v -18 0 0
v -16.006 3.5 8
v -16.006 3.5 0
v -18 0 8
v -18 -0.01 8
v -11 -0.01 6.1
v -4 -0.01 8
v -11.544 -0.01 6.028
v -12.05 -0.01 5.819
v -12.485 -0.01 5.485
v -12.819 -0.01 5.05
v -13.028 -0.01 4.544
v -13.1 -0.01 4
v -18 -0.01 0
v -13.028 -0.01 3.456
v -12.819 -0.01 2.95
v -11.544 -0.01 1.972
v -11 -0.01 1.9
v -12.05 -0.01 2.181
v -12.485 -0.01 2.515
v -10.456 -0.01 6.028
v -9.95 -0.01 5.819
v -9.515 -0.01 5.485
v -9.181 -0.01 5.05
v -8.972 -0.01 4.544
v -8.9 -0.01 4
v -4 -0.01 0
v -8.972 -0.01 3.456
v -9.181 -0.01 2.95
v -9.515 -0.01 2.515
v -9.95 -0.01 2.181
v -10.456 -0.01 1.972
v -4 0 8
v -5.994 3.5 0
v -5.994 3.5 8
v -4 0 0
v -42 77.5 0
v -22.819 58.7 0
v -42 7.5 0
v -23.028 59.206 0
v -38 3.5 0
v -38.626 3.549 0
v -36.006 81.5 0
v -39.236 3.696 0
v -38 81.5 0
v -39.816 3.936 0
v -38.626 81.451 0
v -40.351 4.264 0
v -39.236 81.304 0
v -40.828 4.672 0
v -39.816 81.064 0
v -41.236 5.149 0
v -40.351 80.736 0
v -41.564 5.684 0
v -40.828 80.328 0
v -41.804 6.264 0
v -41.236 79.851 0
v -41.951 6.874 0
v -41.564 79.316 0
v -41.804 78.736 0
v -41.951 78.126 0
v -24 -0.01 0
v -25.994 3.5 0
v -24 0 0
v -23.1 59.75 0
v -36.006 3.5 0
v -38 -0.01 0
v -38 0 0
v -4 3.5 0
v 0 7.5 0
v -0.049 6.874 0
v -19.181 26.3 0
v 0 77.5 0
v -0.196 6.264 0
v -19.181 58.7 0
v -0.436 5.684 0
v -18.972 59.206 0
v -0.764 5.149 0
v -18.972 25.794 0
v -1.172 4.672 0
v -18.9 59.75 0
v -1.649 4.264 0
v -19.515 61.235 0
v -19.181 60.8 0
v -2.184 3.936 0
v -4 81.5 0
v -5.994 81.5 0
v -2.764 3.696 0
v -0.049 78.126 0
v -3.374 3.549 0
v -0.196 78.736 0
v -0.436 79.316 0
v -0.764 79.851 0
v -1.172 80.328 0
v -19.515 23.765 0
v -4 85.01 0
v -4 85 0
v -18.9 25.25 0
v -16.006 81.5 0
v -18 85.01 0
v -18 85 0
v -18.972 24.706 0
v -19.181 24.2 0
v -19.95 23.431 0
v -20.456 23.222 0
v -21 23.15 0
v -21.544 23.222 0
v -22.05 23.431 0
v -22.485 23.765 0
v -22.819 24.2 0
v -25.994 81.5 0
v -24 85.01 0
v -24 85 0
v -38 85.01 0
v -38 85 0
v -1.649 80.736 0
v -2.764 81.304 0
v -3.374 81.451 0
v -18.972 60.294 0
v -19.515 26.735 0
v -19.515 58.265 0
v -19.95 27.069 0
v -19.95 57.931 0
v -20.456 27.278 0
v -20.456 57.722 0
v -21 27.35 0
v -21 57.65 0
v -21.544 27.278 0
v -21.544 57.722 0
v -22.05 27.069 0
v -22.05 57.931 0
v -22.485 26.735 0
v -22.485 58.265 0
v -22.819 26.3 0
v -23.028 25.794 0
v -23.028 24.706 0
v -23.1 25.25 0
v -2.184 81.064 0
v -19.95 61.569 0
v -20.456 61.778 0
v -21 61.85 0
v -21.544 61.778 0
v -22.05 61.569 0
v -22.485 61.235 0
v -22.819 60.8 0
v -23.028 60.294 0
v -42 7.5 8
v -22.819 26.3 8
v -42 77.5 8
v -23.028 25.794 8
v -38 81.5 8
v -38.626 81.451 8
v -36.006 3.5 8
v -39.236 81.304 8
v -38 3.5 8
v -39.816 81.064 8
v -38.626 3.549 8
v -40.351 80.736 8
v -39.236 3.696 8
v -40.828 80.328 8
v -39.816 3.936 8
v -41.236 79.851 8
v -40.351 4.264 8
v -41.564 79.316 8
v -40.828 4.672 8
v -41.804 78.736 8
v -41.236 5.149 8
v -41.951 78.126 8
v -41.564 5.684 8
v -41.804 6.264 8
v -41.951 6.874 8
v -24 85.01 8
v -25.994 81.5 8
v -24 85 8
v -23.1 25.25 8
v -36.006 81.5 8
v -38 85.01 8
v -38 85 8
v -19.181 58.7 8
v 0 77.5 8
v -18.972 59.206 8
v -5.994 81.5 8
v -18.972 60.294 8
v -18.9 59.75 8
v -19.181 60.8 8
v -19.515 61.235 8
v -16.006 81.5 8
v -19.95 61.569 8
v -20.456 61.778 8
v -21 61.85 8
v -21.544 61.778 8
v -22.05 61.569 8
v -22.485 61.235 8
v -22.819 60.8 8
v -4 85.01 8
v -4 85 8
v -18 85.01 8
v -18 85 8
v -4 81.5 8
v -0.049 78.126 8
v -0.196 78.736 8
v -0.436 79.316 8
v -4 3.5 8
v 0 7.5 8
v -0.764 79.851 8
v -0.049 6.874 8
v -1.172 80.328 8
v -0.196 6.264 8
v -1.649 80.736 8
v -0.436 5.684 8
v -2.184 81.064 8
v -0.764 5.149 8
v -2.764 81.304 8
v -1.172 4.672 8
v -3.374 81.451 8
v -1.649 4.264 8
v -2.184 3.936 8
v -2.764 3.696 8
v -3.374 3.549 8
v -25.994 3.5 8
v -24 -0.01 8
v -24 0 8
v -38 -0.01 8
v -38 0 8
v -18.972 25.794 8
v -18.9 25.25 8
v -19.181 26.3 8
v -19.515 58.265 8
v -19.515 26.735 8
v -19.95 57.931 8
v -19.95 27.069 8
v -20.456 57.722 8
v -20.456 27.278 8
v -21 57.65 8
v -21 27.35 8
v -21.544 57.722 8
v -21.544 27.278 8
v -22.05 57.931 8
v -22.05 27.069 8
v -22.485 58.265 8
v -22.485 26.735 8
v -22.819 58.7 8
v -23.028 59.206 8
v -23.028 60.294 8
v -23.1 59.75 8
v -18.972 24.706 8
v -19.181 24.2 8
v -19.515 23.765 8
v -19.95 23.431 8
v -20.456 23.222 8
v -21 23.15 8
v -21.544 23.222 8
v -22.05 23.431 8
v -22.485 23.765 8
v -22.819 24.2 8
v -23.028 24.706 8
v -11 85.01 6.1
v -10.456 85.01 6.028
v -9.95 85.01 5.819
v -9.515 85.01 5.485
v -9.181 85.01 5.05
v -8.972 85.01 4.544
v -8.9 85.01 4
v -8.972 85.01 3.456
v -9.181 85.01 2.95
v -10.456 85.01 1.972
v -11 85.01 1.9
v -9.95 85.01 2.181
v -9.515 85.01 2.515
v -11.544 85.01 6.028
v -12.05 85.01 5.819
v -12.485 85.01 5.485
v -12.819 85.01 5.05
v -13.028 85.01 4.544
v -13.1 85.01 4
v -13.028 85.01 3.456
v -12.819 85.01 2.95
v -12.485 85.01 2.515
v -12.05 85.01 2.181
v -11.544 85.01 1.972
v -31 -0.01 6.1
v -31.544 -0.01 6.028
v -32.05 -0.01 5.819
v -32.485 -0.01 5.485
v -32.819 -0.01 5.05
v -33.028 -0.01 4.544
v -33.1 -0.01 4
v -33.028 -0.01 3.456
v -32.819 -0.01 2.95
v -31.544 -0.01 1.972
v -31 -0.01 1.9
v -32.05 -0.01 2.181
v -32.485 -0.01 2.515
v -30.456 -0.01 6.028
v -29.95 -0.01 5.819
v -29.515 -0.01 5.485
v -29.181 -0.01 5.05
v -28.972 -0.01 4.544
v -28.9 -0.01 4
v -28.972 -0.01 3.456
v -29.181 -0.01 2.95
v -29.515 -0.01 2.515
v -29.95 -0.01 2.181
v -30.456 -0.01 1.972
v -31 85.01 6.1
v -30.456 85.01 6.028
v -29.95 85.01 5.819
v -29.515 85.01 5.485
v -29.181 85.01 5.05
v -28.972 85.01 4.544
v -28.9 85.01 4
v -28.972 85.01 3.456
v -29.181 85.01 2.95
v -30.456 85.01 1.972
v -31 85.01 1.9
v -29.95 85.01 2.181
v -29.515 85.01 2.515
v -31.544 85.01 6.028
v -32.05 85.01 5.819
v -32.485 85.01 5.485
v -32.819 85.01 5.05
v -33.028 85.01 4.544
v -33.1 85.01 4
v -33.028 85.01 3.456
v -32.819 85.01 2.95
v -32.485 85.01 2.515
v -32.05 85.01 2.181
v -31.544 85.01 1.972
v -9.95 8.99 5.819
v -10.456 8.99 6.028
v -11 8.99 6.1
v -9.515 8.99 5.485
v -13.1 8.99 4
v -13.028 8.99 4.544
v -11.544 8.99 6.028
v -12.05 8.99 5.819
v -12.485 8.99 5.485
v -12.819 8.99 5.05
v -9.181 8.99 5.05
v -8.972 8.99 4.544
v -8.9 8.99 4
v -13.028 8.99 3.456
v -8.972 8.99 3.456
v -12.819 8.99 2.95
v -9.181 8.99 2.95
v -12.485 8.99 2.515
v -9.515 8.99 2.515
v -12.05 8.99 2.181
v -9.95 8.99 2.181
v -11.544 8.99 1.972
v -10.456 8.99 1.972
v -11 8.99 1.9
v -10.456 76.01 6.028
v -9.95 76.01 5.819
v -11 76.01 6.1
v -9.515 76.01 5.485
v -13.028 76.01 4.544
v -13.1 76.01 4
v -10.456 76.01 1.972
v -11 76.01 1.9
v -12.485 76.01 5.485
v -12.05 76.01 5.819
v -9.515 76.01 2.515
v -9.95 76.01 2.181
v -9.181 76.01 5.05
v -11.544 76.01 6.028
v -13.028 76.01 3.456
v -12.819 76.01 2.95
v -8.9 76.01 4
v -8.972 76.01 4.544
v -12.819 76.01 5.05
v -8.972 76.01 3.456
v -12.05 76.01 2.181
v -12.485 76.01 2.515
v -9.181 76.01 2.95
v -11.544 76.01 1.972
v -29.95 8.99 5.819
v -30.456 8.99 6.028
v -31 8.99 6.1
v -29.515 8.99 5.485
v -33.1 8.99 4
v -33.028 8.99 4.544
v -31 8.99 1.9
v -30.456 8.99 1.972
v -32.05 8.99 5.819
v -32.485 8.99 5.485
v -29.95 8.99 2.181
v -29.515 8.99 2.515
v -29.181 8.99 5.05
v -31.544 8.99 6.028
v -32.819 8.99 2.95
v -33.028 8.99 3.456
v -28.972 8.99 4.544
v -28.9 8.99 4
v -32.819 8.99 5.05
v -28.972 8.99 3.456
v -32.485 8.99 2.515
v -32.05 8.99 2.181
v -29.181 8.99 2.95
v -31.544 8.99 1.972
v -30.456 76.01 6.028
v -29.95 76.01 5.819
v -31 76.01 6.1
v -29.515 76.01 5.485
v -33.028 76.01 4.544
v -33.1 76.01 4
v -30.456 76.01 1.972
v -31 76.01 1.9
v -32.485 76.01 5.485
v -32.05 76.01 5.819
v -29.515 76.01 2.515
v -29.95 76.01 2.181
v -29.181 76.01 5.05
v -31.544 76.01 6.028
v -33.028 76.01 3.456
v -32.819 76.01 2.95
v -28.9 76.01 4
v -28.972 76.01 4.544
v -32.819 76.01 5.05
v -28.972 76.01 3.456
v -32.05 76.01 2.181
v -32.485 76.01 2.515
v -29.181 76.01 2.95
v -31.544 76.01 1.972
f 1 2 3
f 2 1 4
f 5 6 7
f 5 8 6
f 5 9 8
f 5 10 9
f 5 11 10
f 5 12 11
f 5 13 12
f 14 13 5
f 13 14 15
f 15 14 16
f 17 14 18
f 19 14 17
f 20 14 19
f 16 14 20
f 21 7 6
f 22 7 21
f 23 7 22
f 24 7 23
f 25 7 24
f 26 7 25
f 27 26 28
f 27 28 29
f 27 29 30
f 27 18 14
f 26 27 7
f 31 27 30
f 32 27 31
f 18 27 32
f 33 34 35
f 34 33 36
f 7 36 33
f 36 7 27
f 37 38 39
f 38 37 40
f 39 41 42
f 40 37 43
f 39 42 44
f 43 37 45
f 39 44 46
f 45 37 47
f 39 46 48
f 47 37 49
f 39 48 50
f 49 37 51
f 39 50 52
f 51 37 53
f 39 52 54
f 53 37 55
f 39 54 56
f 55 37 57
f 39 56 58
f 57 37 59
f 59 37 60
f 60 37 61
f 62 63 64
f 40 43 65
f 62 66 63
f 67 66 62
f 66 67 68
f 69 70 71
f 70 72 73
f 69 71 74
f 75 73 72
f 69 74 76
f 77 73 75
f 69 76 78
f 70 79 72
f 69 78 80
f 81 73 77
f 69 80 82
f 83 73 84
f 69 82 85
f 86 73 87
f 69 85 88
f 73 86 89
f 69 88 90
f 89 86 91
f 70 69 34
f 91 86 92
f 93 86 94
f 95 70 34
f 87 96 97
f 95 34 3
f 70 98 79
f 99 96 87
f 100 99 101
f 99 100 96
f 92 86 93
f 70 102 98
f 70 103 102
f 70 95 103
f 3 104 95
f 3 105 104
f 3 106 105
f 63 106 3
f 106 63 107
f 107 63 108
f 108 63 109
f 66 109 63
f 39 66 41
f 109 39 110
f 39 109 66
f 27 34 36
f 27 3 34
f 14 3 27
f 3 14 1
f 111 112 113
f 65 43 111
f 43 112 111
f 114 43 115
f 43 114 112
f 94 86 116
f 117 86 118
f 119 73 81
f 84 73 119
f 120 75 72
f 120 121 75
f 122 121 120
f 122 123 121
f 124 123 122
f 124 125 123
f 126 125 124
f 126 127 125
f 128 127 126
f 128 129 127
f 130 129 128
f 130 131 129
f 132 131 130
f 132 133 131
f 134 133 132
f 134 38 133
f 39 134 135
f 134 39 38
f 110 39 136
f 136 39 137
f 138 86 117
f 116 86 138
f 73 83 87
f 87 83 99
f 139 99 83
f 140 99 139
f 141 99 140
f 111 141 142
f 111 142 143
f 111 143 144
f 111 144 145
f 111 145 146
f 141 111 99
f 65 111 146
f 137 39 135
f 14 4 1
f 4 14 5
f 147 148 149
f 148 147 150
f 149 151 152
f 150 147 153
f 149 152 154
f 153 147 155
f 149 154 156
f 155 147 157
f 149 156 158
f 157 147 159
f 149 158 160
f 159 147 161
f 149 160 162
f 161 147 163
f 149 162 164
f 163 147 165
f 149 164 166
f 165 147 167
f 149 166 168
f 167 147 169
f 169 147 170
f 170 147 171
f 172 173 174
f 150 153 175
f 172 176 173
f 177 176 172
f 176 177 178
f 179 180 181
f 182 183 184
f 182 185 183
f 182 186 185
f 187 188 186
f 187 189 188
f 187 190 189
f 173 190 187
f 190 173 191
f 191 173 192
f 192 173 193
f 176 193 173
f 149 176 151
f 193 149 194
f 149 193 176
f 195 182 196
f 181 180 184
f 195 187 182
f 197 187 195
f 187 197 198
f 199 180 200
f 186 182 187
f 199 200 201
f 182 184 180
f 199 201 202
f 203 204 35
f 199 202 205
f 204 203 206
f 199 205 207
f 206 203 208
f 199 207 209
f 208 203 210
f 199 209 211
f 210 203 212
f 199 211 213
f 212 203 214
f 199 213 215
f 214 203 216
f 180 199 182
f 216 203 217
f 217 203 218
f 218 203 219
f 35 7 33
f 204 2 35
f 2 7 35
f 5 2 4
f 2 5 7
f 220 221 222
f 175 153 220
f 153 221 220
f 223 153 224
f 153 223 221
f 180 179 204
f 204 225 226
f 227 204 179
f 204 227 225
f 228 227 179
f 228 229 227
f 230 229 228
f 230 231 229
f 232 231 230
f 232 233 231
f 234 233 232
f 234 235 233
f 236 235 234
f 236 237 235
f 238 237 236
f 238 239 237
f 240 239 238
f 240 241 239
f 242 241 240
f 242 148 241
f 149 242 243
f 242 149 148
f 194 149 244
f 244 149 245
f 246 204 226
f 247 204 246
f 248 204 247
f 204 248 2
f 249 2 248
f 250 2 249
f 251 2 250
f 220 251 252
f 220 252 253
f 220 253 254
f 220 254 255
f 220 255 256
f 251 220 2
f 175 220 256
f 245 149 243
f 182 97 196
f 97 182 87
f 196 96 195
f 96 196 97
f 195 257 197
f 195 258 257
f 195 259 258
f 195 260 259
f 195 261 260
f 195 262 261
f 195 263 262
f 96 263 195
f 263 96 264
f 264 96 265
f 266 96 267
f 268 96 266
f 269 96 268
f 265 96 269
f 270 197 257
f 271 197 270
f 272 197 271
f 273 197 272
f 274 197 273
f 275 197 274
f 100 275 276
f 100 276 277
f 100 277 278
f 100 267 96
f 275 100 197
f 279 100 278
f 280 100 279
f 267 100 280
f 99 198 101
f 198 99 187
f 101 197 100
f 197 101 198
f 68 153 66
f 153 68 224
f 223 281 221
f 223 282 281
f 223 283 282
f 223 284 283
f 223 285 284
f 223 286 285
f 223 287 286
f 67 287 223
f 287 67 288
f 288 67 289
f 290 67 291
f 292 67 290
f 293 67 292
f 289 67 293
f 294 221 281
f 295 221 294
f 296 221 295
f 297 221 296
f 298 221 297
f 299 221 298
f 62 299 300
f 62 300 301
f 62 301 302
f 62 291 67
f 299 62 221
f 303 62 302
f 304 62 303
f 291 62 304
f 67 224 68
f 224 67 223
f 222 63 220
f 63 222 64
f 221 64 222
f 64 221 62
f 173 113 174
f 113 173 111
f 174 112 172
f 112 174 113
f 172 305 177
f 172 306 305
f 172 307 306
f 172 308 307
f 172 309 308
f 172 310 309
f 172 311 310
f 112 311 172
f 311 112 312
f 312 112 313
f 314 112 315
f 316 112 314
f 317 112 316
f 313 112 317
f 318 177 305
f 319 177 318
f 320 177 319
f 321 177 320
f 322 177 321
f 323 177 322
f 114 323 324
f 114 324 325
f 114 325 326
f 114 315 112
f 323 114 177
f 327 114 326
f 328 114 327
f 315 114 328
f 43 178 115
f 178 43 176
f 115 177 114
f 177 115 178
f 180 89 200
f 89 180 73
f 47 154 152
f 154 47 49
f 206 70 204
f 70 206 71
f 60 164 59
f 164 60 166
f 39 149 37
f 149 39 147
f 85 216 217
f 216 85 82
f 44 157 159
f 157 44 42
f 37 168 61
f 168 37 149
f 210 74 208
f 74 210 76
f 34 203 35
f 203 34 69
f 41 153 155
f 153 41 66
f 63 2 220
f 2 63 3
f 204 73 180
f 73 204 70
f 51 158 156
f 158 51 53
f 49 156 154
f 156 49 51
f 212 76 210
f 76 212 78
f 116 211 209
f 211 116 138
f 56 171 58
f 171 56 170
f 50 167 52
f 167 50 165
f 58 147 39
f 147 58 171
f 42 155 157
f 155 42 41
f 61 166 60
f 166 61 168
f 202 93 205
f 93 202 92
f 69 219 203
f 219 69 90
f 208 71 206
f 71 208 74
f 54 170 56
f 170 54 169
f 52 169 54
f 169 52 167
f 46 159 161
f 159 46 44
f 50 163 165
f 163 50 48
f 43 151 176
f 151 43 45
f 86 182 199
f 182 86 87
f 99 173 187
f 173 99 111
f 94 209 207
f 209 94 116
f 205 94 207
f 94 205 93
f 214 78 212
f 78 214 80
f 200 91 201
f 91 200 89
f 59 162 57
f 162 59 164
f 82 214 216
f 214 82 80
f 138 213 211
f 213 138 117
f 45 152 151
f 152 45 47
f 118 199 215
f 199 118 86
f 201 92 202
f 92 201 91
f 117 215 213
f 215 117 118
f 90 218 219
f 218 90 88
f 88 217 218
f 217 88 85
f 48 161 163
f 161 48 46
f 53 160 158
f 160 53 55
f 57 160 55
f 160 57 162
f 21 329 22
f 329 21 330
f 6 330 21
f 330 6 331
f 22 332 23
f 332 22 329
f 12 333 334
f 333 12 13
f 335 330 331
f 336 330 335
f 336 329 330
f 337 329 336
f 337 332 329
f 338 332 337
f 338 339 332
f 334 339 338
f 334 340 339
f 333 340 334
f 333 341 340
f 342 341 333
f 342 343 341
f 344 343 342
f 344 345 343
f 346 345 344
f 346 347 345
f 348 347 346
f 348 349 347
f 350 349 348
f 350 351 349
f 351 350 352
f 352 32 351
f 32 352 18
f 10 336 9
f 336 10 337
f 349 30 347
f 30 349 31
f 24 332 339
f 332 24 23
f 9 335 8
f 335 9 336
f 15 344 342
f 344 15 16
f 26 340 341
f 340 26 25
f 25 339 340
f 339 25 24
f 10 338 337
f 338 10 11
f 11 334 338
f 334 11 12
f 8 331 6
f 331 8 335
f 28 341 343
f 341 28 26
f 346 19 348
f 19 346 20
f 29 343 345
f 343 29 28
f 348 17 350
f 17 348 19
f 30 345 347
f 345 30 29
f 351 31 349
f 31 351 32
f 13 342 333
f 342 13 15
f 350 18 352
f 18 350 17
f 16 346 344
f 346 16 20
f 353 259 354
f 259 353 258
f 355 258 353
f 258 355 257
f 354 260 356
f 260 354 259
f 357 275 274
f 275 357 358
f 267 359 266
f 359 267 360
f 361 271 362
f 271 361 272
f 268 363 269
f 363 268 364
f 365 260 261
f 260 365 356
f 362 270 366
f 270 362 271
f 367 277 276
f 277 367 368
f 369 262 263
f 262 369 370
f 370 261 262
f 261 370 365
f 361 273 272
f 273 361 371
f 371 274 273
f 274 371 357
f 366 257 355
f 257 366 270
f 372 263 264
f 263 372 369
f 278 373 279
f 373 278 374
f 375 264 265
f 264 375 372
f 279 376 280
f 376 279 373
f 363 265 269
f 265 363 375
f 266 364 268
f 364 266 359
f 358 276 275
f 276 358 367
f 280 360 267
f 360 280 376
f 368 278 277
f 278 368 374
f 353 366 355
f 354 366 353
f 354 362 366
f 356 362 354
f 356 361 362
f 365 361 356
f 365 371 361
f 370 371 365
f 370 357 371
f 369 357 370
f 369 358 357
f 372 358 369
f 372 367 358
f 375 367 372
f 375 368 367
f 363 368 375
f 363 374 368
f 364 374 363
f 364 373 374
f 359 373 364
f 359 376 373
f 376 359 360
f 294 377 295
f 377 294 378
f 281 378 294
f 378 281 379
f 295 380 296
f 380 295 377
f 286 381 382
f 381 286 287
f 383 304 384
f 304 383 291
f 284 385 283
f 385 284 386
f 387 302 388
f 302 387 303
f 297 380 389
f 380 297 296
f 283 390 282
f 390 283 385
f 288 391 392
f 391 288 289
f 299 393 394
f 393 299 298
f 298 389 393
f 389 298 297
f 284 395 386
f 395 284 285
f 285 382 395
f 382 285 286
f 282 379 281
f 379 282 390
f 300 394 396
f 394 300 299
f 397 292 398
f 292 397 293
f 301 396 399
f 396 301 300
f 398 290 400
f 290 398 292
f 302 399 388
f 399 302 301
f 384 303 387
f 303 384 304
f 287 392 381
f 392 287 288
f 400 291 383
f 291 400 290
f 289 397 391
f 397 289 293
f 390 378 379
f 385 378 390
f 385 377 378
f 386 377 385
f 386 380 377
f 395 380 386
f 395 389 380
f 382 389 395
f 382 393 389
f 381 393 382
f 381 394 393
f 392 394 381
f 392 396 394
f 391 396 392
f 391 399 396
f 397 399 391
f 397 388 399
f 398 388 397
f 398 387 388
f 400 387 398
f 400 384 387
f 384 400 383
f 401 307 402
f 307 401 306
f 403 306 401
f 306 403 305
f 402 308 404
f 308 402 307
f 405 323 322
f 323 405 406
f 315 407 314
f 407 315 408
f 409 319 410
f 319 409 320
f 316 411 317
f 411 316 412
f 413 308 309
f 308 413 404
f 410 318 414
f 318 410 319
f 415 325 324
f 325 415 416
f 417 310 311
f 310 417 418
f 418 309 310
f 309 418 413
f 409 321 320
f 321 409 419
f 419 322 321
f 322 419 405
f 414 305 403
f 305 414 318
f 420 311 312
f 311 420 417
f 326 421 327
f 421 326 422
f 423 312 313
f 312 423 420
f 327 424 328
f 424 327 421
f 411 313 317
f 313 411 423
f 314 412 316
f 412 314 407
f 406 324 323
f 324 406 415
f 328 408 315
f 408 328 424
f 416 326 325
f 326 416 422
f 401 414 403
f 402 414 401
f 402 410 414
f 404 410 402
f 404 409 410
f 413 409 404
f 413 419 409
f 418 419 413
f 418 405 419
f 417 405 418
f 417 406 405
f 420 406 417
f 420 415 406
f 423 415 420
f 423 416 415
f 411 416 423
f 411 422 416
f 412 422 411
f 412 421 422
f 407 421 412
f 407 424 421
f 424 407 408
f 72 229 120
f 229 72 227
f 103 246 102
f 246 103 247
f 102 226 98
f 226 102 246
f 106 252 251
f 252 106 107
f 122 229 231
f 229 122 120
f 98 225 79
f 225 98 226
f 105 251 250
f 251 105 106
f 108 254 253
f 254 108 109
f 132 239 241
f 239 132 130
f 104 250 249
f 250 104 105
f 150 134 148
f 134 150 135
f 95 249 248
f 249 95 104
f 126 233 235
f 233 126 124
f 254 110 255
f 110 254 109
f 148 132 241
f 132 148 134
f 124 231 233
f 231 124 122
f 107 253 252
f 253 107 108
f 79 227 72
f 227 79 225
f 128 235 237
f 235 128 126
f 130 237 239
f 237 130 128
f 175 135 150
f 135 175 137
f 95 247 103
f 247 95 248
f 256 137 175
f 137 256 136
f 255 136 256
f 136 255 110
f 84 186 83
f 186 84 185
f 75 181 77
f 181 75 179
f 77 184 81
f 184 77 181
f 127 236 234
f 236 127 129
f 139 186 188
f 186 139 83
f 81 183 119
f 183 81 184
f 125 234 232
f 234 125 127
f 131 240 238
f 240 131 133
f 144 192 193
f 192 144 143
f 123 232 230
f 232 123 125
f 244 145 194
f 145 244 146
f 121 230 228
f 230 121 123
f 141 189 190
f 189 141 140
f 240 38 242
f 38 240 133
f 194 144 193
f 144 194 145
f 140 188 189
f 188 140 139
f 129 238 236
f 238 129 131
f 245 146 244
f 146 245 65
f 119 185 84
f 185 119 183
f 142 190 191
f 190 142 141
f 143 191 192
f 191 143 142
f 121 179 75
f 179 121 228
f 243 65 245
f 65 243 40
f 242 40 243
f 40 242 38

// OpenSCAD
include <../lib/meshtastic-drybag-node-lib.scad>;
$fn = 40;
cheek_print(false);
